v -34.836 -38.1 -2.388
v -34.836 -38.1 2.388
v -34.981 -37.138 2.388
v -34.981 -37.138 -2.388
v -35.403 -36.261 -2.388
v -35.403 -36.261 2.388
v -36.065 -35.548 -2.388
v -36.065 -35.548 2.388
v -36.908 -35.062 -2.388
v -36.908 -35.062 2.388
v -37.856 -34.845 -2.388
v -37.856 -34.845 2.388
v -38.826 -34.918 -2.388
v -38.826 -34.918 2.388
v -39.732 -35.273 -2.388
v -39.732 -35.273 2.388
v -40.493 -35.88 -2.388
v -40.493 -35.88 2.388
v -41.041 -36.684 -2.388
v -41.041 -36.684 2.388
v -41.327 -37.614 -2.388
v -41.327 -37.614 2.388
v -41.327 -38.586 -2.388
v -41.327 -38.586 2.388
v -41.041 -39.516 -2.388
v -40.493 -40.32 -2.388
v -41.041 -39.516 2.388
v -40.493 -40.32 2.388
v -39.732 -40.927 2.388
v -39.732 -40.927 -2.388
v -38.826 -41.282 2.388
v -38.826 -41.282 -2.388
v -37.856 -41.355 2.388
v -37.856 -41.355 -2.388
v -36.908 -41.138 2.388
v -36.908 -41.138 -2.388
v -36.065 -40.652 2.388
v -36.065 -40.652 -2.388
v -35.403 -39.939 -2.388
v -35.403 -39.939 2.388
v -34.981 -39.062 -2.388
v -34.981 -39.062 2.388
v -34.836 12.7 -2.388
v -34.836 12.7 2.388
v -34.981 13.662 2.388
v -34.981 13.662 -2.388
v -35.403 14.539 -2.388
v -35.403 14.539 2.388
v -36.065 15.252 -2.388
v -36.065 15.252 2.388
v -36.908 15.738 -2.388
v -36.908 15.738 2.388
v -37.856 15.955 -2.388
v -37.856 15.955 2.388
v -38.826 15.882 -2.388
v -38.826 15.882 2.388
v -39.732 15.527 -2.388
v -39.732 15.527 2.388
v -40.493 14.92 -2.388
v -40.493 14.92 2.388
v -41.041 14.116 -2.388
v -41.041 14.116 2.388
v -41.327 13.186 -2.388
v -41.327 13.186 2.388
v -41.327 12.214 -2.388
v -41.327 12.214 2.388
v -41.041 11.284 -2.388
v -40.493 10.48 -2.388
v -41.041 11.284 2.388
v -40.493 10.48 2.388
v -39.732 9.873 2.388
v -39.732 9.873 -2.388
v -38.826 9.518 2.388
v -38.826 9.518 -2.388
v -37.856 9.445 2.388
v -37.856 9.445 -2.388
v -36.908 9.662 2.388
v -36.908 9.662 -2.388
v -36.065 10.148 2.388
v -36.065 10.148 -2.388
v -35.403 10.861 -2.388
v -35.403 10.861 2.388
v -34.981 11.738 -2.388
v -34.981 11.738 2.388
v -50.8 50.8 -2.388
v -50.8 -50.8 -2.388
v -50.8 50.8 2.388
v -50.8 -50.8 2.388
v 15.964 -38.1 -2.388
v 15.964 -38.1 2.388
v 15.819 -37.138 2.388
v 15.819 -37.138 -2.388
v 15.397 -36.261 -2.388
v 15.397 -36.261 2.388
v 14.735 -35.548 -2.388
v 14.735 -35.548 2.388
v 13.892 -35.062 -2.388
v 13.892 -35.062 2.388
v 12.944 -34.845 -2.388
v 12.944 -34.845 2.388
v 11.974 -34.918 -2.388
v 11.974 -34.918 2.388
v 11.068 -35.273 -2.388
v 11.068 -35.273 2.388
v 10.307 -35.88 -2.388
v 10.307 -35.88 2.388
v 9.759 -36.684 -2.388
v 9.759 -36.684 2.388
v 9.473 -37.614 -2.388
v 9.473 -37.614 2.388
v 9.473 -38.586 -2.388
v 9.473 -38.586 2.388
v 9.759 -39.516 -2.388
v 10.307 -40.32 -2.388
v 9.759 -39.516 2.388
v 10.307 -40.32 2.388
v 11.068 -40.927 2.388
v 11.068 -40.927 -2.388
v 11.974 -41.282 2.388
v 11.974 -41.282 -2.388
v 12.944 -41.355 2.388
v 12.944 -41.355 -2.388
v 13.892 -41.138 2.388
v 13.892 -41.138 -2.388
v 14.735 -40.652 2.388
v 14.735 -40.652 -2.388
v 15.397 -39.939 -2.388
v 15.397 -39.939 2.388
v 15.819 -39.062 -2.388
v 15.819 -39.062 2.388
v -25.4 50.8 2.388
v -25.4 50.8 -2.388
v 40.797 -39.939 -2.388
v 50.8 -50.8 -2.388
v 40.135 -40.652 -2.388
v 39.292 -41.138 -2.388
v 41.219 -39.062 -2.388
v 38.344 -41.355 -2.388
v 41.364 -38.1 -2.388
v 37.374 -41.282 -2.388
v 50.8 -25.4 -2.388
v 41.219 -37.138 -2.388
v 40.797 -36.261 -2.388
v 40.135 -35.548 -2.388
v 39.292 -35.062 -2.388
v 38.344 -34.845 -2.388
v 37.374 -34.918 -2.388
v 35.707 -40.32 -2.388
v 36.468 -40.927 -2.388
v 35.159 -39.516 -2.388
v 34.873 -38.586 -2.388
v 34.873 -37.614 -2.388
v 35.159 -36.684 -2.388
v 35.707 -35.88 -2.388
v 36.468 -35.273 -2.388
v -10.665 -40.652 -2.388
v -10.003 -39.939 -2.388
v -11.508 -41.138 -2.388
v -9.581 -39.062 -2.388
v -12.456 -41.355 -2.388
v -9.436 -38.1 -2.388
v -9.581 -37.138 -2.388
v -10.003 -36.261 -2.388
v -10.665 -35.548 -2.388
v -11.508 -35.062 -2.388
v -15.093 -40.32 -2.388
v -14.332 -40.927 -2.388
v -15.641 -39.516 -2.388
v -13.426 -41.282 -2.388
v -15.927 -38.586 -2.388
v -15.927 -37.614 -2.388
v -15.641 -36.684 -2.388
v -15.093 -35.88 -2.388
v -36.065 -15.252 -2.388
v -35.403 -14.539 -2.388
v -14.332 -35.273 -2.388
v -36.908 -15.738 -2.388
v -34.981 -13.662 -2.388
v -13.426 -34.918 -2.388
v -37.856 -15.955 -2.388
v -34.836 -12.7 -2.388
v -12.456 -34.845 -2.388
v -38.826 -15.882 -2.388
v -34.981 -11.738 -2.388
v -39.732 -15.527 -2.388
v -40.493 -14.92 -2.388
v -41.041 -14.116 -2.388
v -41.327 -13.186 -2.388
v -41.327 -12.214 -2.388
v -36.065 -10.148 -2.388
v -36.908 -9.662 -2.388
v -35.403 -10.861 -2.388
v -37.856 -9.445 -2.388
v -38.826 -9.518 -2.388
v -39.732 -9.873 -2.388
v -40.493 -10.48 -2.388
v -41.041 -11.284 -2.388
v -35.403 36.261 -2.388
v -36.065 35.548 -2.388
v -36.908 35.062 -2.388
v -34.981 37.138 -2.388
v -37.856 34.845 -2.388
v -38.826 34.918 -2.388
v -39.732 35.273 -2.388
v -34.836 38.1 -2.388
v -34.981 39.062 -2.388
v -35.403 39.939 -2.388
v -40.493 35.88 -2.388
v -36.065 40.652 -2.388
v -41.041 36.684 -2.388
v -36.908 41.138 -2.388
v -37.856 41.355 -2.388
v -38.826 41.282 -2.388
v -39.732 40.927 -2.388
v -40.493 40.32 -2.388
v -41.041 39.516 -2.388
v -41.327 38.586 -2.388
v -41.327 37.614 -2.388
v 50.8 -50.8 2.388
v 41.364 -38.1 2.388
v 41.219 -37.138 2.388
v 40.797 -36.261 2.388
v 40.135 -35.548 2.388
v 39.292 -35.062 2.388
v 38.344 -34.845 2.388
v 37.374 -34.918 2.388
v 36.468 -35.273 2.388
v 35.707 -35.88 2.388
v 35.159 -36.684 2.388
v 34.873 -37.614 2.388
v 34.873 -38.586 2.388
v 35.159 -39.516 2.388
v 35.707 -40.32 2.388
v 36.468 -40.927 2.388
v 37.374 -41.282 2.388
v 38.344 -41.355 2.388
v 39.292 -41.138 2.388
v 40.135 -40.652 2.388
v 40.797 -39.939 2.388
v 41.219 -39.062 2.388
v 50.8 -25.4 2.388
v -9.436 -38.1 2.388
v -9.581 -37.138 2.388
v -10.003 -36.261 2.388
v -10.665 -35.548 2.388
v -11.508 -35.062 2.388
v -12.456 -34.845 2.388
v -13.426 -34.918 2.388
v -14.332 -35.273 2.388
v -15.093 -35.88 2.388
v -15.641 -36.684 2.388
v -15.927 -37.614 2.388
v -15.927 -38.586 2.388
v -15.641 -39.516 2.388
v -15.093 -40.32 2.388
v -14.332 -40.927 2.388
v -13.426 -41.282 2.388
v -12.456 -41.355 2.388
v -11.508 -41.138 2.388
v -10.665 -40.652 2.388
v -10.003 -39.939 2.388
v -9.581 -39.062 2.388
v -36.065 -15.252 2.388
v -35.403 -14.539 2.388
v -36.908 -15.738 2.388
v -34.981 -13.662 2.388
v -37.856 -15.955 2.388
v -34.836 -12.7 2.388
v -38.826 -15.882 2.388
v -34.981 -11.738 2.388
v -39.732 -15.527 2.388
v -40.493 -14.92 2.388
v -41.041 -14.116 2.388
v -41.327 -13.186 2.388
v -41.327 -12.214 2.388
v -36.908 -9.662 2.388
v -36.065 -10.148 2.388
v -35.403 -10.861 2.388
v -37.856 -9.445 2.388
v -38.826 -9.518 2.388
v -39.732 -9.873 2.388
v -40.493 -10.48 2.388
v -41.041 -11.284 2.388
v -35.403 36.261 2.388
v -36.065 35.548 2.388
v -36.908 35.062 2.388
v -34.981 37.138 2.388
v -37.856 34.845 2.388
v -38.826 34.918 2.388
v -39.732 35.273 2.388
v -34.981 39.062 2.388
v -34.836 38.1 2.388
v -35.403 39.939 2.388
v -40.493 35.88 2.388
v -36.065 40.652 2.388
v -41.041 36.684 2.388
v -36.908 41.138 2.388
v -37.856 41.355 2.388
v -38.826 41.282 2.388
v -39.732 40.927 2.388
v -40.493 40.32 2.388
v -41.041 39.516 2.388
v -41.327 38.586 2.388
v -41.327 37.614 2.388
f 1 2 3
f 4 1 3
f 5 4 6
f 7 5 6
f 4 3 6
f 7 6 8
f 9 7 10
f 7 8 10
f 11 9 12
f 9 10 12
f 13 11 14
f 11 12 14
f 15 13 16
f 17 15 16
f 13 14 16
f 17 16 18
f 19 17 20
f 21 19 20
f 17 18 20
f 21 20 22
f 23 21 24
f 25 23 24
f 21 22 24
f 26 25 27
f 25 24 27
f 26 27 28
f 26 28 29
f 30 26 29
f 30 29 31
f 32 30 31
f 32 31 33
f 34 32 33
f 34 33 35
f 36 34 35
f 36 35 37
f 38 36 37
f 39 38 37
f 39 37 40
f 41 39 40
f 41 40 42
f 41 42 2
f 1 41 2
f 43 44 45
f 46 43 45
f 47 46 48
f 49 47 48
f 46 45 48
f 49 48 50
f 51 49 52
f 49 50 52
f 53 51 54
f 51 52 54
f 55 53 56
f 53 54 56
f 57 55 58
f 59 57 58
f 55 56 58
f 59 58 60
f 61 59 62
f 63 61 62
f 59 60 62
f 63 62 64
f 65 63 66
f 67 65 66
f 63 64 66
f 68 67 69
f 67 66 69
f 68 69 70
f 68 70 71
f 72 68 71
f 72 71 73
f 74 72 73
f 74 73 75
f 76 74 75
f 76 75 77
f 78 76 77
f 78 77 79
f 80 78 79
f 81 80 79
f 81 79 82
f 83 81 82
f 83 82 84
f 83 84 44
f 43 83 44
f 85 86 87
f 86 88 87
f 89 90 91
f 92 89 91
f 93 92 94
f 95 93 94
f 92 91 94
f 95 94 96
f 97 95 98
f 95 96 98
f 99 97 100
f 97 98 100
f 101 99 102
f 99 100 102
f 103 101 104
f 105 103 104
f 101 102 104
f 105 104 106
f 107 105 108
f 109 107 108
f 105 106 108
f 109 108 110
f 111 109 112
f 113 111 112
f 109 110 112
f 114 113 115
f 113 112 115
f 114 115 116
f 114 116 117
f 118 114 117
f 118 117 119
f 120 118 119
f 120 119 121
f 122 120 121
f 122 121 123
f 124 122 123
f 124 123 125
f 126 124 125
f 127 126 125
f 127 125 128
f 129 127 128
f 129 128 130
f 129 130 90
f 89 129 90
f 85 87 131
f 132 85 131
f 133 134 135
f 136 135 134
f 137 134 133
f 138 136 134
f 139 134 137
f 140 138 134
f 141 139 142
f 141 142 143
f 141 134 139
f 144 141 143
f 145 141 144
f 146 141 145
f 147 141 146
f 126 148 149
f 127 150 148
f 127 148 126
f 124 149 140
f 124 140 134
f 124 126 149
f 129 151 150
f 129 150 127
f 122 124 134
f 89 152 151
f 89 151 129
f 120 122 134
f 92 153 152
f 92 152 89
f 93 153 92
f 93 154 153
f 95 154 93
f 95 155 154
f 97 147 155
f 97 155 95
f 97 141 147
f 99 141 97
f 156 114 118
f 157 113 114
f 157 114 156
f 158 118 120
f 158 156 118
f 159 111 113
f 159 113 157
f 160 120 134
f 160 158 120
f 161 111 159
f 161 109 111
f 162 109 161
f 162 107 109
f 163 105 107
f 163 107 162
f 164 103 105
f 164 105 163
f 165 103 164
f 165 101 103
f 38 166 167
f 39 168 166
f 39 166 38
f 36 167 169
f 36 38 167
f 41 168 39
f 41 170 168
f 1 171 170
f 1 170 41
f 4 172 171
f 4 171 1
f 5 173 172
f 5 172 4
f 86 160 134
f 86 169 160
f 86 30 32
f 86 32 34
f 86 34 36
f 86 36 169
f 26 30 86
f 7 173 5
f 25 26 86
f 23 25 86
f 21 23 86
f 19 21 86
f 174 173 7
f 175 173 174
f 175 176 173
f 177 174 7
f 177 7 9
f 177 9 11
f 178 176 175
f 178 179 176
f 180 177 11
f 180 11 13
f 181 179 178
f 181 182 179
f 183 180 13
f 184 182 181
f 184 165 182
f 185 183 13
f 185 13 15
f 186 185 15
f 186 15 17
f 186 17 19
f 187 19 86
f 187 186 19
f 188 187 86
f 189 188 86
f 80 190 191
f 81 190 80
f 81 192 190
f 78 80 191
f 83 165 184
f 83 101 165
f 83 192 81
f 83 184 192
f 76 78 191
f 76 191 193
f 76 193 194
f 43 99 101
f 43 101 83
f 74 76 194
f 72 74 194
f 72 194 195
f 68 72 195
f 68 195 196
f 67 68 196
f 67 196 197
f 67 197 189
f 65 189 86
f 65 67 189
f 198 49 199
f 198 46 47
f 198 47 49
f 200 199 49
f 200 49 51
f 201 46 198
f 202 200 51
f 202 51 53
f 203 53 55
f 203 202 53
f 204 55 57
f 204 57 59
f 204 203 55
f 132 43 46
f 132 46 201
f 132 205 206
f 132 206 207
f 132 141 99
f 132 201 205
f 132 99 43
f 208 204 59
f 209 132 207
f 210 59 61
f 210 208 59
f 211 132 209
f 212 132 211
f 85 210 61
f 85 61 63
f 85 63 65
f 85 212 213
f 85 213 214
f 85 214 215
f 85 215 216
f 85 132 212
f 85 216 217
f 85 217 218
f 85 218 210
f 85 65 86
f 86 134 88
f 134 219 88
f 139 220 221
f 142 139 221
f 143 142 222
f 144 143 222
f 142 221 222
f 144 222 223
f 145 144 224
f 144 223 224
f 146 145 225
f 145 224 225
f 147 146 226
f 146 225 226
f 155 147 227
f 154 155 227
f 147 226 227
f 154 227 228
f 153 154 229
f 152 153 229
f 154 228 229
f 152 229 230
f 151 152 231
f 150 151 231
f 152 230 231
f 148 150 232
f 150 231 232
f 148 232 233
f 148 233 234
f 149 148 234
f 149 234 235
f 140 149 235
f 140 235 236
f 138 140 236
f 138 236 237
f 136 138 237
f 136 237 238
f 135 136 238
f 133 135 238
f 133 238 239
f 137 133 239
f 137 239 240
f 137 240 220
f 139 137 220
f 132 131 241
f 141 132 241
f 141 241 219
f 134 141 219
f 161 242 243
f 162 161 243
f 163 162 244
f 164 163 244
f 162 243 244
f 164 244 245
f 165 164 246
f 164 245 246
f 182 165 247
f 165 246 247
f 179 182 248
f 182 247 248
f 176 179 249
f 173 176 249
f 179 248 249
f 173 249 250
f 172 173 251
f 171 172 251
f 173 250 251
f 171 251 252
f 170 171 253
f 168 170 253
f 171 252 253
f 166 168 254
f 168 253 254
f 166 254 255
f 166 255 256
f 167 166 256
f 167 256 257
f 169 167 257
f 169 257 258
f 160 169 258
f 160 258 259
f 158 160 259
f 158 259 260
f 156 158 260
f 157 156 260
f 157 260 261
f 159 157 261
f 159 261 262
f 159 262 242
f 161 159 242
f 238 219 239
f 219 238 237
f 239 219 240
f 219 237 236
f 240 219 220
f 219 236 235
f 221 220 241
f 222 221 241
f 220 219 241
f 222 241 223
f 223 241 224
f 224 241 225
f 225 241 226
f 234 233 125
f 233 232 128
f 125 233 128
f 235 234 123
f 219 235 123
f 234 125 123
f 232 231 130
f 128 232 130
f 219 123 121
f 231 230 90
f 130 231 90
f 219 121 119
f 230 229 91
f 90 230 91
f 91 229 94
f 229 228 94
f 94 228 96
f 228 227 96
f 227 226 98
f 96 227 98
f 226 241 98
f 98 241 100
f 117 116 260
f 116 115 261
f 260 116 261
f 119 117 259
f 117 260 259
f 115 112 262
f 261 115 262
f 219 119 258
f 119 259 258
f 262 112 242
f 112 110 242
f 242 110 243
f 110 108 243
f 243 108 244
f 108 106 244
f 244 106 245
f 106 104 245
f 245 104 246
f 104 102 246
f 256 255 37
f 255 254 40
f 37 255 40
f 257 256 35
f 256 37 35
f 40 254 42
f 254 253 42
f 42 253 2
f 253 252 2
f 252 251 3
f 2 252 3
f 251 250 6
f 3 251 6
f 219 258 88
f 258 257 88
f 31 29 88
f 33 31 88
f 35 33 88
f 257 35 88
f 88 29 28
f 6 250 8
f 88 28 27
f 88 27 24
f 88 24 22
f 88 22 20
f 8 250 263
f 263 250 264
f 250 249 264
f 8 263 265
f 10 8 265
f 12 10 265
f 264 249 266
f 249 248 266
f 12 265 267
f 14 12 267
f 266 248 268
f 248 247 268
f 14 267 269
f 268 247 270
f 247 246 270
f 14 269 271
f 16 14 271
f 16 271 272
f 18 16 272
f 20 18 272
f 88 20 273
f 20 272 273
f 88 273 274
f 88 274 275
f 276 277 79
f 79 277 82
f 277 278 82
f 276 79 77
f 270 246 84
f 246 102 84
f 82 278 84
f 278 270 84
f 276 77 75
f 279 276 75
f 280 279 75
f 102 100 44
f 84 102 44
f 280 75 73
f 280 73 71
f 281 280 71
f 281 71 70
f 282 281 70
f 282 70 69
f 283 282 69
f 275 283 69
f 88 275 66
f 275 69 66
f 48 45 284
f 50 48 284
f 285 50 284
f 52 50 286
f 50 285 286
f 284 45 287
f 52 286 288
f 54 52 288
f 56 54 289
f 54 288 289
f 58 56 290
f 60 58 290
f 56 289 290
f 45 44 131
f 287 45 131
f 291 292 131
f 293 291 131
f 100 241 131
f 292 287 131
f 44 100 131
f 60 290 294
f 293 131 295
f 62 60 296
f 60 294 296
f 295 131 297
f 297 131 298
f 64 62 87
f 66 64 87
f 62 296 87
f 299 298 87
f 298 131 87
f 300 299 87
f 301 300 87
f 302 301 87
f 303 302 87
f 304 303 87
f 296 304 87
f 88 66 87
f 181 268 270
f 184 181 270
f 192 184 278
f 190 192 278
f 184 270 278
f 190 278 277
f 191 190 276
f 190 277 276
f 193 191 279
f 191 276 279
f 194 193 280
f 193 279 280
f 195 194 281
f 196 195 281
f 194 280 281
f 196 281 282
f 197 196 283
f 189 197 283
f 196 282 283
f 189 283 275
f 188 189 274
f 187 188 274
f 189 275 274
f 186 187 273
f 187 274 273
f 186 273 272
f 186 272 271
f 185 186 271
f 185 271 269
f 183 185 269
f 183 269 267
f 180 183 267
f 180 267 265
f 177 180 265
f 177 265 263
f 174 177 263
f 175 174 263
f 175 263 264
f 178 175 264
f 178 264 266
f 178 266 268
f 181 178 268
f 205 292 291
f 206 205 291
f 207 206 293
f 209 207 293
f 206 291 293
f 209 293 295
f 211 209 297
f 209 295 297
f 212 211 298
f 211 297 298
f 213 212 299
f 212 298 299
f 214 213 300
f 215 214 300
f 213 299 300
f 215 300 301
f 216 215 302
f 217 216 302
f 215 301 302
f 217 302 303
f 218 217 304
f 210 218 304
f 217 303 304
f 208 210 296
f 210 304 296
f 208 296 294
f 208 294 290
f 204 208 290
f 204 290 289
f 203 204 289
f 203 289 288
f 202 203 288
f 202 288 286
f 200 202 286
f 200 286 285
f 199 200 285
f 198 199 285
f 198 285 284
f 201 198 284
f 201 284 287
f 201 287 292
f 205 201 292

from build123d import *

# Parameters (mm, degrees)
BOSS_EXTRUDE1_DEPTH      = 2.3876
BOSS_EXTRUDE1_DEPTH_BACK = 2.3876
SKETCH4_R                = 3.2639
CUT_EXTRUDE1_DEPTH       = 5.7752


with BuildPart() as part:
    # Sketch3 → Boss-Extrude1 (new body, two sides)
    with BuildSketch(Plane.XY) as boss_extrude1_sk:
        Polygon((50.8, -25.4), (50.8, -50.8), (-50.8, -50.8), (-50.8, 50.8), (-25.4, 50.8), align=None)
    extrude(amount=BOSS_EXTRUDE1_DEPTH)
    extrude(boss_extrude1_sk.sketch, amount=-BOSS_EXTRUDE1_DEPTH_BACK)

    # Sketch4 → Cut-Extrude1 (cut, through all)
    with BuildSketch(Plane.XY.offset(2.3876)):
        with Locations((-38.1, -38.1)):
            Circle(SKETCH4_R)
        with Locations((-12.7, -38.1)):
            Circle(SKETCH4_R)
        with Locations((12.7, -38.1)):
            Circle(SKETCH4_R)
        with Locations((-38.1, -12.7)):
            Circle(SKETCH4_R)
        with Locations((-38.1, 12.7)):
            Circle(SKETCH4_R)
        with Locations((38.1, -38.1)):
            Circle(SKETCH4_R)
        with Locations((-38.1, 38.1)):
            Circle(SKETCH4_R)
    extrude(amount=-CUT_EXTRUDE1_DEPTH, mode=Mode.SUBTRACT)


solid = part.part
